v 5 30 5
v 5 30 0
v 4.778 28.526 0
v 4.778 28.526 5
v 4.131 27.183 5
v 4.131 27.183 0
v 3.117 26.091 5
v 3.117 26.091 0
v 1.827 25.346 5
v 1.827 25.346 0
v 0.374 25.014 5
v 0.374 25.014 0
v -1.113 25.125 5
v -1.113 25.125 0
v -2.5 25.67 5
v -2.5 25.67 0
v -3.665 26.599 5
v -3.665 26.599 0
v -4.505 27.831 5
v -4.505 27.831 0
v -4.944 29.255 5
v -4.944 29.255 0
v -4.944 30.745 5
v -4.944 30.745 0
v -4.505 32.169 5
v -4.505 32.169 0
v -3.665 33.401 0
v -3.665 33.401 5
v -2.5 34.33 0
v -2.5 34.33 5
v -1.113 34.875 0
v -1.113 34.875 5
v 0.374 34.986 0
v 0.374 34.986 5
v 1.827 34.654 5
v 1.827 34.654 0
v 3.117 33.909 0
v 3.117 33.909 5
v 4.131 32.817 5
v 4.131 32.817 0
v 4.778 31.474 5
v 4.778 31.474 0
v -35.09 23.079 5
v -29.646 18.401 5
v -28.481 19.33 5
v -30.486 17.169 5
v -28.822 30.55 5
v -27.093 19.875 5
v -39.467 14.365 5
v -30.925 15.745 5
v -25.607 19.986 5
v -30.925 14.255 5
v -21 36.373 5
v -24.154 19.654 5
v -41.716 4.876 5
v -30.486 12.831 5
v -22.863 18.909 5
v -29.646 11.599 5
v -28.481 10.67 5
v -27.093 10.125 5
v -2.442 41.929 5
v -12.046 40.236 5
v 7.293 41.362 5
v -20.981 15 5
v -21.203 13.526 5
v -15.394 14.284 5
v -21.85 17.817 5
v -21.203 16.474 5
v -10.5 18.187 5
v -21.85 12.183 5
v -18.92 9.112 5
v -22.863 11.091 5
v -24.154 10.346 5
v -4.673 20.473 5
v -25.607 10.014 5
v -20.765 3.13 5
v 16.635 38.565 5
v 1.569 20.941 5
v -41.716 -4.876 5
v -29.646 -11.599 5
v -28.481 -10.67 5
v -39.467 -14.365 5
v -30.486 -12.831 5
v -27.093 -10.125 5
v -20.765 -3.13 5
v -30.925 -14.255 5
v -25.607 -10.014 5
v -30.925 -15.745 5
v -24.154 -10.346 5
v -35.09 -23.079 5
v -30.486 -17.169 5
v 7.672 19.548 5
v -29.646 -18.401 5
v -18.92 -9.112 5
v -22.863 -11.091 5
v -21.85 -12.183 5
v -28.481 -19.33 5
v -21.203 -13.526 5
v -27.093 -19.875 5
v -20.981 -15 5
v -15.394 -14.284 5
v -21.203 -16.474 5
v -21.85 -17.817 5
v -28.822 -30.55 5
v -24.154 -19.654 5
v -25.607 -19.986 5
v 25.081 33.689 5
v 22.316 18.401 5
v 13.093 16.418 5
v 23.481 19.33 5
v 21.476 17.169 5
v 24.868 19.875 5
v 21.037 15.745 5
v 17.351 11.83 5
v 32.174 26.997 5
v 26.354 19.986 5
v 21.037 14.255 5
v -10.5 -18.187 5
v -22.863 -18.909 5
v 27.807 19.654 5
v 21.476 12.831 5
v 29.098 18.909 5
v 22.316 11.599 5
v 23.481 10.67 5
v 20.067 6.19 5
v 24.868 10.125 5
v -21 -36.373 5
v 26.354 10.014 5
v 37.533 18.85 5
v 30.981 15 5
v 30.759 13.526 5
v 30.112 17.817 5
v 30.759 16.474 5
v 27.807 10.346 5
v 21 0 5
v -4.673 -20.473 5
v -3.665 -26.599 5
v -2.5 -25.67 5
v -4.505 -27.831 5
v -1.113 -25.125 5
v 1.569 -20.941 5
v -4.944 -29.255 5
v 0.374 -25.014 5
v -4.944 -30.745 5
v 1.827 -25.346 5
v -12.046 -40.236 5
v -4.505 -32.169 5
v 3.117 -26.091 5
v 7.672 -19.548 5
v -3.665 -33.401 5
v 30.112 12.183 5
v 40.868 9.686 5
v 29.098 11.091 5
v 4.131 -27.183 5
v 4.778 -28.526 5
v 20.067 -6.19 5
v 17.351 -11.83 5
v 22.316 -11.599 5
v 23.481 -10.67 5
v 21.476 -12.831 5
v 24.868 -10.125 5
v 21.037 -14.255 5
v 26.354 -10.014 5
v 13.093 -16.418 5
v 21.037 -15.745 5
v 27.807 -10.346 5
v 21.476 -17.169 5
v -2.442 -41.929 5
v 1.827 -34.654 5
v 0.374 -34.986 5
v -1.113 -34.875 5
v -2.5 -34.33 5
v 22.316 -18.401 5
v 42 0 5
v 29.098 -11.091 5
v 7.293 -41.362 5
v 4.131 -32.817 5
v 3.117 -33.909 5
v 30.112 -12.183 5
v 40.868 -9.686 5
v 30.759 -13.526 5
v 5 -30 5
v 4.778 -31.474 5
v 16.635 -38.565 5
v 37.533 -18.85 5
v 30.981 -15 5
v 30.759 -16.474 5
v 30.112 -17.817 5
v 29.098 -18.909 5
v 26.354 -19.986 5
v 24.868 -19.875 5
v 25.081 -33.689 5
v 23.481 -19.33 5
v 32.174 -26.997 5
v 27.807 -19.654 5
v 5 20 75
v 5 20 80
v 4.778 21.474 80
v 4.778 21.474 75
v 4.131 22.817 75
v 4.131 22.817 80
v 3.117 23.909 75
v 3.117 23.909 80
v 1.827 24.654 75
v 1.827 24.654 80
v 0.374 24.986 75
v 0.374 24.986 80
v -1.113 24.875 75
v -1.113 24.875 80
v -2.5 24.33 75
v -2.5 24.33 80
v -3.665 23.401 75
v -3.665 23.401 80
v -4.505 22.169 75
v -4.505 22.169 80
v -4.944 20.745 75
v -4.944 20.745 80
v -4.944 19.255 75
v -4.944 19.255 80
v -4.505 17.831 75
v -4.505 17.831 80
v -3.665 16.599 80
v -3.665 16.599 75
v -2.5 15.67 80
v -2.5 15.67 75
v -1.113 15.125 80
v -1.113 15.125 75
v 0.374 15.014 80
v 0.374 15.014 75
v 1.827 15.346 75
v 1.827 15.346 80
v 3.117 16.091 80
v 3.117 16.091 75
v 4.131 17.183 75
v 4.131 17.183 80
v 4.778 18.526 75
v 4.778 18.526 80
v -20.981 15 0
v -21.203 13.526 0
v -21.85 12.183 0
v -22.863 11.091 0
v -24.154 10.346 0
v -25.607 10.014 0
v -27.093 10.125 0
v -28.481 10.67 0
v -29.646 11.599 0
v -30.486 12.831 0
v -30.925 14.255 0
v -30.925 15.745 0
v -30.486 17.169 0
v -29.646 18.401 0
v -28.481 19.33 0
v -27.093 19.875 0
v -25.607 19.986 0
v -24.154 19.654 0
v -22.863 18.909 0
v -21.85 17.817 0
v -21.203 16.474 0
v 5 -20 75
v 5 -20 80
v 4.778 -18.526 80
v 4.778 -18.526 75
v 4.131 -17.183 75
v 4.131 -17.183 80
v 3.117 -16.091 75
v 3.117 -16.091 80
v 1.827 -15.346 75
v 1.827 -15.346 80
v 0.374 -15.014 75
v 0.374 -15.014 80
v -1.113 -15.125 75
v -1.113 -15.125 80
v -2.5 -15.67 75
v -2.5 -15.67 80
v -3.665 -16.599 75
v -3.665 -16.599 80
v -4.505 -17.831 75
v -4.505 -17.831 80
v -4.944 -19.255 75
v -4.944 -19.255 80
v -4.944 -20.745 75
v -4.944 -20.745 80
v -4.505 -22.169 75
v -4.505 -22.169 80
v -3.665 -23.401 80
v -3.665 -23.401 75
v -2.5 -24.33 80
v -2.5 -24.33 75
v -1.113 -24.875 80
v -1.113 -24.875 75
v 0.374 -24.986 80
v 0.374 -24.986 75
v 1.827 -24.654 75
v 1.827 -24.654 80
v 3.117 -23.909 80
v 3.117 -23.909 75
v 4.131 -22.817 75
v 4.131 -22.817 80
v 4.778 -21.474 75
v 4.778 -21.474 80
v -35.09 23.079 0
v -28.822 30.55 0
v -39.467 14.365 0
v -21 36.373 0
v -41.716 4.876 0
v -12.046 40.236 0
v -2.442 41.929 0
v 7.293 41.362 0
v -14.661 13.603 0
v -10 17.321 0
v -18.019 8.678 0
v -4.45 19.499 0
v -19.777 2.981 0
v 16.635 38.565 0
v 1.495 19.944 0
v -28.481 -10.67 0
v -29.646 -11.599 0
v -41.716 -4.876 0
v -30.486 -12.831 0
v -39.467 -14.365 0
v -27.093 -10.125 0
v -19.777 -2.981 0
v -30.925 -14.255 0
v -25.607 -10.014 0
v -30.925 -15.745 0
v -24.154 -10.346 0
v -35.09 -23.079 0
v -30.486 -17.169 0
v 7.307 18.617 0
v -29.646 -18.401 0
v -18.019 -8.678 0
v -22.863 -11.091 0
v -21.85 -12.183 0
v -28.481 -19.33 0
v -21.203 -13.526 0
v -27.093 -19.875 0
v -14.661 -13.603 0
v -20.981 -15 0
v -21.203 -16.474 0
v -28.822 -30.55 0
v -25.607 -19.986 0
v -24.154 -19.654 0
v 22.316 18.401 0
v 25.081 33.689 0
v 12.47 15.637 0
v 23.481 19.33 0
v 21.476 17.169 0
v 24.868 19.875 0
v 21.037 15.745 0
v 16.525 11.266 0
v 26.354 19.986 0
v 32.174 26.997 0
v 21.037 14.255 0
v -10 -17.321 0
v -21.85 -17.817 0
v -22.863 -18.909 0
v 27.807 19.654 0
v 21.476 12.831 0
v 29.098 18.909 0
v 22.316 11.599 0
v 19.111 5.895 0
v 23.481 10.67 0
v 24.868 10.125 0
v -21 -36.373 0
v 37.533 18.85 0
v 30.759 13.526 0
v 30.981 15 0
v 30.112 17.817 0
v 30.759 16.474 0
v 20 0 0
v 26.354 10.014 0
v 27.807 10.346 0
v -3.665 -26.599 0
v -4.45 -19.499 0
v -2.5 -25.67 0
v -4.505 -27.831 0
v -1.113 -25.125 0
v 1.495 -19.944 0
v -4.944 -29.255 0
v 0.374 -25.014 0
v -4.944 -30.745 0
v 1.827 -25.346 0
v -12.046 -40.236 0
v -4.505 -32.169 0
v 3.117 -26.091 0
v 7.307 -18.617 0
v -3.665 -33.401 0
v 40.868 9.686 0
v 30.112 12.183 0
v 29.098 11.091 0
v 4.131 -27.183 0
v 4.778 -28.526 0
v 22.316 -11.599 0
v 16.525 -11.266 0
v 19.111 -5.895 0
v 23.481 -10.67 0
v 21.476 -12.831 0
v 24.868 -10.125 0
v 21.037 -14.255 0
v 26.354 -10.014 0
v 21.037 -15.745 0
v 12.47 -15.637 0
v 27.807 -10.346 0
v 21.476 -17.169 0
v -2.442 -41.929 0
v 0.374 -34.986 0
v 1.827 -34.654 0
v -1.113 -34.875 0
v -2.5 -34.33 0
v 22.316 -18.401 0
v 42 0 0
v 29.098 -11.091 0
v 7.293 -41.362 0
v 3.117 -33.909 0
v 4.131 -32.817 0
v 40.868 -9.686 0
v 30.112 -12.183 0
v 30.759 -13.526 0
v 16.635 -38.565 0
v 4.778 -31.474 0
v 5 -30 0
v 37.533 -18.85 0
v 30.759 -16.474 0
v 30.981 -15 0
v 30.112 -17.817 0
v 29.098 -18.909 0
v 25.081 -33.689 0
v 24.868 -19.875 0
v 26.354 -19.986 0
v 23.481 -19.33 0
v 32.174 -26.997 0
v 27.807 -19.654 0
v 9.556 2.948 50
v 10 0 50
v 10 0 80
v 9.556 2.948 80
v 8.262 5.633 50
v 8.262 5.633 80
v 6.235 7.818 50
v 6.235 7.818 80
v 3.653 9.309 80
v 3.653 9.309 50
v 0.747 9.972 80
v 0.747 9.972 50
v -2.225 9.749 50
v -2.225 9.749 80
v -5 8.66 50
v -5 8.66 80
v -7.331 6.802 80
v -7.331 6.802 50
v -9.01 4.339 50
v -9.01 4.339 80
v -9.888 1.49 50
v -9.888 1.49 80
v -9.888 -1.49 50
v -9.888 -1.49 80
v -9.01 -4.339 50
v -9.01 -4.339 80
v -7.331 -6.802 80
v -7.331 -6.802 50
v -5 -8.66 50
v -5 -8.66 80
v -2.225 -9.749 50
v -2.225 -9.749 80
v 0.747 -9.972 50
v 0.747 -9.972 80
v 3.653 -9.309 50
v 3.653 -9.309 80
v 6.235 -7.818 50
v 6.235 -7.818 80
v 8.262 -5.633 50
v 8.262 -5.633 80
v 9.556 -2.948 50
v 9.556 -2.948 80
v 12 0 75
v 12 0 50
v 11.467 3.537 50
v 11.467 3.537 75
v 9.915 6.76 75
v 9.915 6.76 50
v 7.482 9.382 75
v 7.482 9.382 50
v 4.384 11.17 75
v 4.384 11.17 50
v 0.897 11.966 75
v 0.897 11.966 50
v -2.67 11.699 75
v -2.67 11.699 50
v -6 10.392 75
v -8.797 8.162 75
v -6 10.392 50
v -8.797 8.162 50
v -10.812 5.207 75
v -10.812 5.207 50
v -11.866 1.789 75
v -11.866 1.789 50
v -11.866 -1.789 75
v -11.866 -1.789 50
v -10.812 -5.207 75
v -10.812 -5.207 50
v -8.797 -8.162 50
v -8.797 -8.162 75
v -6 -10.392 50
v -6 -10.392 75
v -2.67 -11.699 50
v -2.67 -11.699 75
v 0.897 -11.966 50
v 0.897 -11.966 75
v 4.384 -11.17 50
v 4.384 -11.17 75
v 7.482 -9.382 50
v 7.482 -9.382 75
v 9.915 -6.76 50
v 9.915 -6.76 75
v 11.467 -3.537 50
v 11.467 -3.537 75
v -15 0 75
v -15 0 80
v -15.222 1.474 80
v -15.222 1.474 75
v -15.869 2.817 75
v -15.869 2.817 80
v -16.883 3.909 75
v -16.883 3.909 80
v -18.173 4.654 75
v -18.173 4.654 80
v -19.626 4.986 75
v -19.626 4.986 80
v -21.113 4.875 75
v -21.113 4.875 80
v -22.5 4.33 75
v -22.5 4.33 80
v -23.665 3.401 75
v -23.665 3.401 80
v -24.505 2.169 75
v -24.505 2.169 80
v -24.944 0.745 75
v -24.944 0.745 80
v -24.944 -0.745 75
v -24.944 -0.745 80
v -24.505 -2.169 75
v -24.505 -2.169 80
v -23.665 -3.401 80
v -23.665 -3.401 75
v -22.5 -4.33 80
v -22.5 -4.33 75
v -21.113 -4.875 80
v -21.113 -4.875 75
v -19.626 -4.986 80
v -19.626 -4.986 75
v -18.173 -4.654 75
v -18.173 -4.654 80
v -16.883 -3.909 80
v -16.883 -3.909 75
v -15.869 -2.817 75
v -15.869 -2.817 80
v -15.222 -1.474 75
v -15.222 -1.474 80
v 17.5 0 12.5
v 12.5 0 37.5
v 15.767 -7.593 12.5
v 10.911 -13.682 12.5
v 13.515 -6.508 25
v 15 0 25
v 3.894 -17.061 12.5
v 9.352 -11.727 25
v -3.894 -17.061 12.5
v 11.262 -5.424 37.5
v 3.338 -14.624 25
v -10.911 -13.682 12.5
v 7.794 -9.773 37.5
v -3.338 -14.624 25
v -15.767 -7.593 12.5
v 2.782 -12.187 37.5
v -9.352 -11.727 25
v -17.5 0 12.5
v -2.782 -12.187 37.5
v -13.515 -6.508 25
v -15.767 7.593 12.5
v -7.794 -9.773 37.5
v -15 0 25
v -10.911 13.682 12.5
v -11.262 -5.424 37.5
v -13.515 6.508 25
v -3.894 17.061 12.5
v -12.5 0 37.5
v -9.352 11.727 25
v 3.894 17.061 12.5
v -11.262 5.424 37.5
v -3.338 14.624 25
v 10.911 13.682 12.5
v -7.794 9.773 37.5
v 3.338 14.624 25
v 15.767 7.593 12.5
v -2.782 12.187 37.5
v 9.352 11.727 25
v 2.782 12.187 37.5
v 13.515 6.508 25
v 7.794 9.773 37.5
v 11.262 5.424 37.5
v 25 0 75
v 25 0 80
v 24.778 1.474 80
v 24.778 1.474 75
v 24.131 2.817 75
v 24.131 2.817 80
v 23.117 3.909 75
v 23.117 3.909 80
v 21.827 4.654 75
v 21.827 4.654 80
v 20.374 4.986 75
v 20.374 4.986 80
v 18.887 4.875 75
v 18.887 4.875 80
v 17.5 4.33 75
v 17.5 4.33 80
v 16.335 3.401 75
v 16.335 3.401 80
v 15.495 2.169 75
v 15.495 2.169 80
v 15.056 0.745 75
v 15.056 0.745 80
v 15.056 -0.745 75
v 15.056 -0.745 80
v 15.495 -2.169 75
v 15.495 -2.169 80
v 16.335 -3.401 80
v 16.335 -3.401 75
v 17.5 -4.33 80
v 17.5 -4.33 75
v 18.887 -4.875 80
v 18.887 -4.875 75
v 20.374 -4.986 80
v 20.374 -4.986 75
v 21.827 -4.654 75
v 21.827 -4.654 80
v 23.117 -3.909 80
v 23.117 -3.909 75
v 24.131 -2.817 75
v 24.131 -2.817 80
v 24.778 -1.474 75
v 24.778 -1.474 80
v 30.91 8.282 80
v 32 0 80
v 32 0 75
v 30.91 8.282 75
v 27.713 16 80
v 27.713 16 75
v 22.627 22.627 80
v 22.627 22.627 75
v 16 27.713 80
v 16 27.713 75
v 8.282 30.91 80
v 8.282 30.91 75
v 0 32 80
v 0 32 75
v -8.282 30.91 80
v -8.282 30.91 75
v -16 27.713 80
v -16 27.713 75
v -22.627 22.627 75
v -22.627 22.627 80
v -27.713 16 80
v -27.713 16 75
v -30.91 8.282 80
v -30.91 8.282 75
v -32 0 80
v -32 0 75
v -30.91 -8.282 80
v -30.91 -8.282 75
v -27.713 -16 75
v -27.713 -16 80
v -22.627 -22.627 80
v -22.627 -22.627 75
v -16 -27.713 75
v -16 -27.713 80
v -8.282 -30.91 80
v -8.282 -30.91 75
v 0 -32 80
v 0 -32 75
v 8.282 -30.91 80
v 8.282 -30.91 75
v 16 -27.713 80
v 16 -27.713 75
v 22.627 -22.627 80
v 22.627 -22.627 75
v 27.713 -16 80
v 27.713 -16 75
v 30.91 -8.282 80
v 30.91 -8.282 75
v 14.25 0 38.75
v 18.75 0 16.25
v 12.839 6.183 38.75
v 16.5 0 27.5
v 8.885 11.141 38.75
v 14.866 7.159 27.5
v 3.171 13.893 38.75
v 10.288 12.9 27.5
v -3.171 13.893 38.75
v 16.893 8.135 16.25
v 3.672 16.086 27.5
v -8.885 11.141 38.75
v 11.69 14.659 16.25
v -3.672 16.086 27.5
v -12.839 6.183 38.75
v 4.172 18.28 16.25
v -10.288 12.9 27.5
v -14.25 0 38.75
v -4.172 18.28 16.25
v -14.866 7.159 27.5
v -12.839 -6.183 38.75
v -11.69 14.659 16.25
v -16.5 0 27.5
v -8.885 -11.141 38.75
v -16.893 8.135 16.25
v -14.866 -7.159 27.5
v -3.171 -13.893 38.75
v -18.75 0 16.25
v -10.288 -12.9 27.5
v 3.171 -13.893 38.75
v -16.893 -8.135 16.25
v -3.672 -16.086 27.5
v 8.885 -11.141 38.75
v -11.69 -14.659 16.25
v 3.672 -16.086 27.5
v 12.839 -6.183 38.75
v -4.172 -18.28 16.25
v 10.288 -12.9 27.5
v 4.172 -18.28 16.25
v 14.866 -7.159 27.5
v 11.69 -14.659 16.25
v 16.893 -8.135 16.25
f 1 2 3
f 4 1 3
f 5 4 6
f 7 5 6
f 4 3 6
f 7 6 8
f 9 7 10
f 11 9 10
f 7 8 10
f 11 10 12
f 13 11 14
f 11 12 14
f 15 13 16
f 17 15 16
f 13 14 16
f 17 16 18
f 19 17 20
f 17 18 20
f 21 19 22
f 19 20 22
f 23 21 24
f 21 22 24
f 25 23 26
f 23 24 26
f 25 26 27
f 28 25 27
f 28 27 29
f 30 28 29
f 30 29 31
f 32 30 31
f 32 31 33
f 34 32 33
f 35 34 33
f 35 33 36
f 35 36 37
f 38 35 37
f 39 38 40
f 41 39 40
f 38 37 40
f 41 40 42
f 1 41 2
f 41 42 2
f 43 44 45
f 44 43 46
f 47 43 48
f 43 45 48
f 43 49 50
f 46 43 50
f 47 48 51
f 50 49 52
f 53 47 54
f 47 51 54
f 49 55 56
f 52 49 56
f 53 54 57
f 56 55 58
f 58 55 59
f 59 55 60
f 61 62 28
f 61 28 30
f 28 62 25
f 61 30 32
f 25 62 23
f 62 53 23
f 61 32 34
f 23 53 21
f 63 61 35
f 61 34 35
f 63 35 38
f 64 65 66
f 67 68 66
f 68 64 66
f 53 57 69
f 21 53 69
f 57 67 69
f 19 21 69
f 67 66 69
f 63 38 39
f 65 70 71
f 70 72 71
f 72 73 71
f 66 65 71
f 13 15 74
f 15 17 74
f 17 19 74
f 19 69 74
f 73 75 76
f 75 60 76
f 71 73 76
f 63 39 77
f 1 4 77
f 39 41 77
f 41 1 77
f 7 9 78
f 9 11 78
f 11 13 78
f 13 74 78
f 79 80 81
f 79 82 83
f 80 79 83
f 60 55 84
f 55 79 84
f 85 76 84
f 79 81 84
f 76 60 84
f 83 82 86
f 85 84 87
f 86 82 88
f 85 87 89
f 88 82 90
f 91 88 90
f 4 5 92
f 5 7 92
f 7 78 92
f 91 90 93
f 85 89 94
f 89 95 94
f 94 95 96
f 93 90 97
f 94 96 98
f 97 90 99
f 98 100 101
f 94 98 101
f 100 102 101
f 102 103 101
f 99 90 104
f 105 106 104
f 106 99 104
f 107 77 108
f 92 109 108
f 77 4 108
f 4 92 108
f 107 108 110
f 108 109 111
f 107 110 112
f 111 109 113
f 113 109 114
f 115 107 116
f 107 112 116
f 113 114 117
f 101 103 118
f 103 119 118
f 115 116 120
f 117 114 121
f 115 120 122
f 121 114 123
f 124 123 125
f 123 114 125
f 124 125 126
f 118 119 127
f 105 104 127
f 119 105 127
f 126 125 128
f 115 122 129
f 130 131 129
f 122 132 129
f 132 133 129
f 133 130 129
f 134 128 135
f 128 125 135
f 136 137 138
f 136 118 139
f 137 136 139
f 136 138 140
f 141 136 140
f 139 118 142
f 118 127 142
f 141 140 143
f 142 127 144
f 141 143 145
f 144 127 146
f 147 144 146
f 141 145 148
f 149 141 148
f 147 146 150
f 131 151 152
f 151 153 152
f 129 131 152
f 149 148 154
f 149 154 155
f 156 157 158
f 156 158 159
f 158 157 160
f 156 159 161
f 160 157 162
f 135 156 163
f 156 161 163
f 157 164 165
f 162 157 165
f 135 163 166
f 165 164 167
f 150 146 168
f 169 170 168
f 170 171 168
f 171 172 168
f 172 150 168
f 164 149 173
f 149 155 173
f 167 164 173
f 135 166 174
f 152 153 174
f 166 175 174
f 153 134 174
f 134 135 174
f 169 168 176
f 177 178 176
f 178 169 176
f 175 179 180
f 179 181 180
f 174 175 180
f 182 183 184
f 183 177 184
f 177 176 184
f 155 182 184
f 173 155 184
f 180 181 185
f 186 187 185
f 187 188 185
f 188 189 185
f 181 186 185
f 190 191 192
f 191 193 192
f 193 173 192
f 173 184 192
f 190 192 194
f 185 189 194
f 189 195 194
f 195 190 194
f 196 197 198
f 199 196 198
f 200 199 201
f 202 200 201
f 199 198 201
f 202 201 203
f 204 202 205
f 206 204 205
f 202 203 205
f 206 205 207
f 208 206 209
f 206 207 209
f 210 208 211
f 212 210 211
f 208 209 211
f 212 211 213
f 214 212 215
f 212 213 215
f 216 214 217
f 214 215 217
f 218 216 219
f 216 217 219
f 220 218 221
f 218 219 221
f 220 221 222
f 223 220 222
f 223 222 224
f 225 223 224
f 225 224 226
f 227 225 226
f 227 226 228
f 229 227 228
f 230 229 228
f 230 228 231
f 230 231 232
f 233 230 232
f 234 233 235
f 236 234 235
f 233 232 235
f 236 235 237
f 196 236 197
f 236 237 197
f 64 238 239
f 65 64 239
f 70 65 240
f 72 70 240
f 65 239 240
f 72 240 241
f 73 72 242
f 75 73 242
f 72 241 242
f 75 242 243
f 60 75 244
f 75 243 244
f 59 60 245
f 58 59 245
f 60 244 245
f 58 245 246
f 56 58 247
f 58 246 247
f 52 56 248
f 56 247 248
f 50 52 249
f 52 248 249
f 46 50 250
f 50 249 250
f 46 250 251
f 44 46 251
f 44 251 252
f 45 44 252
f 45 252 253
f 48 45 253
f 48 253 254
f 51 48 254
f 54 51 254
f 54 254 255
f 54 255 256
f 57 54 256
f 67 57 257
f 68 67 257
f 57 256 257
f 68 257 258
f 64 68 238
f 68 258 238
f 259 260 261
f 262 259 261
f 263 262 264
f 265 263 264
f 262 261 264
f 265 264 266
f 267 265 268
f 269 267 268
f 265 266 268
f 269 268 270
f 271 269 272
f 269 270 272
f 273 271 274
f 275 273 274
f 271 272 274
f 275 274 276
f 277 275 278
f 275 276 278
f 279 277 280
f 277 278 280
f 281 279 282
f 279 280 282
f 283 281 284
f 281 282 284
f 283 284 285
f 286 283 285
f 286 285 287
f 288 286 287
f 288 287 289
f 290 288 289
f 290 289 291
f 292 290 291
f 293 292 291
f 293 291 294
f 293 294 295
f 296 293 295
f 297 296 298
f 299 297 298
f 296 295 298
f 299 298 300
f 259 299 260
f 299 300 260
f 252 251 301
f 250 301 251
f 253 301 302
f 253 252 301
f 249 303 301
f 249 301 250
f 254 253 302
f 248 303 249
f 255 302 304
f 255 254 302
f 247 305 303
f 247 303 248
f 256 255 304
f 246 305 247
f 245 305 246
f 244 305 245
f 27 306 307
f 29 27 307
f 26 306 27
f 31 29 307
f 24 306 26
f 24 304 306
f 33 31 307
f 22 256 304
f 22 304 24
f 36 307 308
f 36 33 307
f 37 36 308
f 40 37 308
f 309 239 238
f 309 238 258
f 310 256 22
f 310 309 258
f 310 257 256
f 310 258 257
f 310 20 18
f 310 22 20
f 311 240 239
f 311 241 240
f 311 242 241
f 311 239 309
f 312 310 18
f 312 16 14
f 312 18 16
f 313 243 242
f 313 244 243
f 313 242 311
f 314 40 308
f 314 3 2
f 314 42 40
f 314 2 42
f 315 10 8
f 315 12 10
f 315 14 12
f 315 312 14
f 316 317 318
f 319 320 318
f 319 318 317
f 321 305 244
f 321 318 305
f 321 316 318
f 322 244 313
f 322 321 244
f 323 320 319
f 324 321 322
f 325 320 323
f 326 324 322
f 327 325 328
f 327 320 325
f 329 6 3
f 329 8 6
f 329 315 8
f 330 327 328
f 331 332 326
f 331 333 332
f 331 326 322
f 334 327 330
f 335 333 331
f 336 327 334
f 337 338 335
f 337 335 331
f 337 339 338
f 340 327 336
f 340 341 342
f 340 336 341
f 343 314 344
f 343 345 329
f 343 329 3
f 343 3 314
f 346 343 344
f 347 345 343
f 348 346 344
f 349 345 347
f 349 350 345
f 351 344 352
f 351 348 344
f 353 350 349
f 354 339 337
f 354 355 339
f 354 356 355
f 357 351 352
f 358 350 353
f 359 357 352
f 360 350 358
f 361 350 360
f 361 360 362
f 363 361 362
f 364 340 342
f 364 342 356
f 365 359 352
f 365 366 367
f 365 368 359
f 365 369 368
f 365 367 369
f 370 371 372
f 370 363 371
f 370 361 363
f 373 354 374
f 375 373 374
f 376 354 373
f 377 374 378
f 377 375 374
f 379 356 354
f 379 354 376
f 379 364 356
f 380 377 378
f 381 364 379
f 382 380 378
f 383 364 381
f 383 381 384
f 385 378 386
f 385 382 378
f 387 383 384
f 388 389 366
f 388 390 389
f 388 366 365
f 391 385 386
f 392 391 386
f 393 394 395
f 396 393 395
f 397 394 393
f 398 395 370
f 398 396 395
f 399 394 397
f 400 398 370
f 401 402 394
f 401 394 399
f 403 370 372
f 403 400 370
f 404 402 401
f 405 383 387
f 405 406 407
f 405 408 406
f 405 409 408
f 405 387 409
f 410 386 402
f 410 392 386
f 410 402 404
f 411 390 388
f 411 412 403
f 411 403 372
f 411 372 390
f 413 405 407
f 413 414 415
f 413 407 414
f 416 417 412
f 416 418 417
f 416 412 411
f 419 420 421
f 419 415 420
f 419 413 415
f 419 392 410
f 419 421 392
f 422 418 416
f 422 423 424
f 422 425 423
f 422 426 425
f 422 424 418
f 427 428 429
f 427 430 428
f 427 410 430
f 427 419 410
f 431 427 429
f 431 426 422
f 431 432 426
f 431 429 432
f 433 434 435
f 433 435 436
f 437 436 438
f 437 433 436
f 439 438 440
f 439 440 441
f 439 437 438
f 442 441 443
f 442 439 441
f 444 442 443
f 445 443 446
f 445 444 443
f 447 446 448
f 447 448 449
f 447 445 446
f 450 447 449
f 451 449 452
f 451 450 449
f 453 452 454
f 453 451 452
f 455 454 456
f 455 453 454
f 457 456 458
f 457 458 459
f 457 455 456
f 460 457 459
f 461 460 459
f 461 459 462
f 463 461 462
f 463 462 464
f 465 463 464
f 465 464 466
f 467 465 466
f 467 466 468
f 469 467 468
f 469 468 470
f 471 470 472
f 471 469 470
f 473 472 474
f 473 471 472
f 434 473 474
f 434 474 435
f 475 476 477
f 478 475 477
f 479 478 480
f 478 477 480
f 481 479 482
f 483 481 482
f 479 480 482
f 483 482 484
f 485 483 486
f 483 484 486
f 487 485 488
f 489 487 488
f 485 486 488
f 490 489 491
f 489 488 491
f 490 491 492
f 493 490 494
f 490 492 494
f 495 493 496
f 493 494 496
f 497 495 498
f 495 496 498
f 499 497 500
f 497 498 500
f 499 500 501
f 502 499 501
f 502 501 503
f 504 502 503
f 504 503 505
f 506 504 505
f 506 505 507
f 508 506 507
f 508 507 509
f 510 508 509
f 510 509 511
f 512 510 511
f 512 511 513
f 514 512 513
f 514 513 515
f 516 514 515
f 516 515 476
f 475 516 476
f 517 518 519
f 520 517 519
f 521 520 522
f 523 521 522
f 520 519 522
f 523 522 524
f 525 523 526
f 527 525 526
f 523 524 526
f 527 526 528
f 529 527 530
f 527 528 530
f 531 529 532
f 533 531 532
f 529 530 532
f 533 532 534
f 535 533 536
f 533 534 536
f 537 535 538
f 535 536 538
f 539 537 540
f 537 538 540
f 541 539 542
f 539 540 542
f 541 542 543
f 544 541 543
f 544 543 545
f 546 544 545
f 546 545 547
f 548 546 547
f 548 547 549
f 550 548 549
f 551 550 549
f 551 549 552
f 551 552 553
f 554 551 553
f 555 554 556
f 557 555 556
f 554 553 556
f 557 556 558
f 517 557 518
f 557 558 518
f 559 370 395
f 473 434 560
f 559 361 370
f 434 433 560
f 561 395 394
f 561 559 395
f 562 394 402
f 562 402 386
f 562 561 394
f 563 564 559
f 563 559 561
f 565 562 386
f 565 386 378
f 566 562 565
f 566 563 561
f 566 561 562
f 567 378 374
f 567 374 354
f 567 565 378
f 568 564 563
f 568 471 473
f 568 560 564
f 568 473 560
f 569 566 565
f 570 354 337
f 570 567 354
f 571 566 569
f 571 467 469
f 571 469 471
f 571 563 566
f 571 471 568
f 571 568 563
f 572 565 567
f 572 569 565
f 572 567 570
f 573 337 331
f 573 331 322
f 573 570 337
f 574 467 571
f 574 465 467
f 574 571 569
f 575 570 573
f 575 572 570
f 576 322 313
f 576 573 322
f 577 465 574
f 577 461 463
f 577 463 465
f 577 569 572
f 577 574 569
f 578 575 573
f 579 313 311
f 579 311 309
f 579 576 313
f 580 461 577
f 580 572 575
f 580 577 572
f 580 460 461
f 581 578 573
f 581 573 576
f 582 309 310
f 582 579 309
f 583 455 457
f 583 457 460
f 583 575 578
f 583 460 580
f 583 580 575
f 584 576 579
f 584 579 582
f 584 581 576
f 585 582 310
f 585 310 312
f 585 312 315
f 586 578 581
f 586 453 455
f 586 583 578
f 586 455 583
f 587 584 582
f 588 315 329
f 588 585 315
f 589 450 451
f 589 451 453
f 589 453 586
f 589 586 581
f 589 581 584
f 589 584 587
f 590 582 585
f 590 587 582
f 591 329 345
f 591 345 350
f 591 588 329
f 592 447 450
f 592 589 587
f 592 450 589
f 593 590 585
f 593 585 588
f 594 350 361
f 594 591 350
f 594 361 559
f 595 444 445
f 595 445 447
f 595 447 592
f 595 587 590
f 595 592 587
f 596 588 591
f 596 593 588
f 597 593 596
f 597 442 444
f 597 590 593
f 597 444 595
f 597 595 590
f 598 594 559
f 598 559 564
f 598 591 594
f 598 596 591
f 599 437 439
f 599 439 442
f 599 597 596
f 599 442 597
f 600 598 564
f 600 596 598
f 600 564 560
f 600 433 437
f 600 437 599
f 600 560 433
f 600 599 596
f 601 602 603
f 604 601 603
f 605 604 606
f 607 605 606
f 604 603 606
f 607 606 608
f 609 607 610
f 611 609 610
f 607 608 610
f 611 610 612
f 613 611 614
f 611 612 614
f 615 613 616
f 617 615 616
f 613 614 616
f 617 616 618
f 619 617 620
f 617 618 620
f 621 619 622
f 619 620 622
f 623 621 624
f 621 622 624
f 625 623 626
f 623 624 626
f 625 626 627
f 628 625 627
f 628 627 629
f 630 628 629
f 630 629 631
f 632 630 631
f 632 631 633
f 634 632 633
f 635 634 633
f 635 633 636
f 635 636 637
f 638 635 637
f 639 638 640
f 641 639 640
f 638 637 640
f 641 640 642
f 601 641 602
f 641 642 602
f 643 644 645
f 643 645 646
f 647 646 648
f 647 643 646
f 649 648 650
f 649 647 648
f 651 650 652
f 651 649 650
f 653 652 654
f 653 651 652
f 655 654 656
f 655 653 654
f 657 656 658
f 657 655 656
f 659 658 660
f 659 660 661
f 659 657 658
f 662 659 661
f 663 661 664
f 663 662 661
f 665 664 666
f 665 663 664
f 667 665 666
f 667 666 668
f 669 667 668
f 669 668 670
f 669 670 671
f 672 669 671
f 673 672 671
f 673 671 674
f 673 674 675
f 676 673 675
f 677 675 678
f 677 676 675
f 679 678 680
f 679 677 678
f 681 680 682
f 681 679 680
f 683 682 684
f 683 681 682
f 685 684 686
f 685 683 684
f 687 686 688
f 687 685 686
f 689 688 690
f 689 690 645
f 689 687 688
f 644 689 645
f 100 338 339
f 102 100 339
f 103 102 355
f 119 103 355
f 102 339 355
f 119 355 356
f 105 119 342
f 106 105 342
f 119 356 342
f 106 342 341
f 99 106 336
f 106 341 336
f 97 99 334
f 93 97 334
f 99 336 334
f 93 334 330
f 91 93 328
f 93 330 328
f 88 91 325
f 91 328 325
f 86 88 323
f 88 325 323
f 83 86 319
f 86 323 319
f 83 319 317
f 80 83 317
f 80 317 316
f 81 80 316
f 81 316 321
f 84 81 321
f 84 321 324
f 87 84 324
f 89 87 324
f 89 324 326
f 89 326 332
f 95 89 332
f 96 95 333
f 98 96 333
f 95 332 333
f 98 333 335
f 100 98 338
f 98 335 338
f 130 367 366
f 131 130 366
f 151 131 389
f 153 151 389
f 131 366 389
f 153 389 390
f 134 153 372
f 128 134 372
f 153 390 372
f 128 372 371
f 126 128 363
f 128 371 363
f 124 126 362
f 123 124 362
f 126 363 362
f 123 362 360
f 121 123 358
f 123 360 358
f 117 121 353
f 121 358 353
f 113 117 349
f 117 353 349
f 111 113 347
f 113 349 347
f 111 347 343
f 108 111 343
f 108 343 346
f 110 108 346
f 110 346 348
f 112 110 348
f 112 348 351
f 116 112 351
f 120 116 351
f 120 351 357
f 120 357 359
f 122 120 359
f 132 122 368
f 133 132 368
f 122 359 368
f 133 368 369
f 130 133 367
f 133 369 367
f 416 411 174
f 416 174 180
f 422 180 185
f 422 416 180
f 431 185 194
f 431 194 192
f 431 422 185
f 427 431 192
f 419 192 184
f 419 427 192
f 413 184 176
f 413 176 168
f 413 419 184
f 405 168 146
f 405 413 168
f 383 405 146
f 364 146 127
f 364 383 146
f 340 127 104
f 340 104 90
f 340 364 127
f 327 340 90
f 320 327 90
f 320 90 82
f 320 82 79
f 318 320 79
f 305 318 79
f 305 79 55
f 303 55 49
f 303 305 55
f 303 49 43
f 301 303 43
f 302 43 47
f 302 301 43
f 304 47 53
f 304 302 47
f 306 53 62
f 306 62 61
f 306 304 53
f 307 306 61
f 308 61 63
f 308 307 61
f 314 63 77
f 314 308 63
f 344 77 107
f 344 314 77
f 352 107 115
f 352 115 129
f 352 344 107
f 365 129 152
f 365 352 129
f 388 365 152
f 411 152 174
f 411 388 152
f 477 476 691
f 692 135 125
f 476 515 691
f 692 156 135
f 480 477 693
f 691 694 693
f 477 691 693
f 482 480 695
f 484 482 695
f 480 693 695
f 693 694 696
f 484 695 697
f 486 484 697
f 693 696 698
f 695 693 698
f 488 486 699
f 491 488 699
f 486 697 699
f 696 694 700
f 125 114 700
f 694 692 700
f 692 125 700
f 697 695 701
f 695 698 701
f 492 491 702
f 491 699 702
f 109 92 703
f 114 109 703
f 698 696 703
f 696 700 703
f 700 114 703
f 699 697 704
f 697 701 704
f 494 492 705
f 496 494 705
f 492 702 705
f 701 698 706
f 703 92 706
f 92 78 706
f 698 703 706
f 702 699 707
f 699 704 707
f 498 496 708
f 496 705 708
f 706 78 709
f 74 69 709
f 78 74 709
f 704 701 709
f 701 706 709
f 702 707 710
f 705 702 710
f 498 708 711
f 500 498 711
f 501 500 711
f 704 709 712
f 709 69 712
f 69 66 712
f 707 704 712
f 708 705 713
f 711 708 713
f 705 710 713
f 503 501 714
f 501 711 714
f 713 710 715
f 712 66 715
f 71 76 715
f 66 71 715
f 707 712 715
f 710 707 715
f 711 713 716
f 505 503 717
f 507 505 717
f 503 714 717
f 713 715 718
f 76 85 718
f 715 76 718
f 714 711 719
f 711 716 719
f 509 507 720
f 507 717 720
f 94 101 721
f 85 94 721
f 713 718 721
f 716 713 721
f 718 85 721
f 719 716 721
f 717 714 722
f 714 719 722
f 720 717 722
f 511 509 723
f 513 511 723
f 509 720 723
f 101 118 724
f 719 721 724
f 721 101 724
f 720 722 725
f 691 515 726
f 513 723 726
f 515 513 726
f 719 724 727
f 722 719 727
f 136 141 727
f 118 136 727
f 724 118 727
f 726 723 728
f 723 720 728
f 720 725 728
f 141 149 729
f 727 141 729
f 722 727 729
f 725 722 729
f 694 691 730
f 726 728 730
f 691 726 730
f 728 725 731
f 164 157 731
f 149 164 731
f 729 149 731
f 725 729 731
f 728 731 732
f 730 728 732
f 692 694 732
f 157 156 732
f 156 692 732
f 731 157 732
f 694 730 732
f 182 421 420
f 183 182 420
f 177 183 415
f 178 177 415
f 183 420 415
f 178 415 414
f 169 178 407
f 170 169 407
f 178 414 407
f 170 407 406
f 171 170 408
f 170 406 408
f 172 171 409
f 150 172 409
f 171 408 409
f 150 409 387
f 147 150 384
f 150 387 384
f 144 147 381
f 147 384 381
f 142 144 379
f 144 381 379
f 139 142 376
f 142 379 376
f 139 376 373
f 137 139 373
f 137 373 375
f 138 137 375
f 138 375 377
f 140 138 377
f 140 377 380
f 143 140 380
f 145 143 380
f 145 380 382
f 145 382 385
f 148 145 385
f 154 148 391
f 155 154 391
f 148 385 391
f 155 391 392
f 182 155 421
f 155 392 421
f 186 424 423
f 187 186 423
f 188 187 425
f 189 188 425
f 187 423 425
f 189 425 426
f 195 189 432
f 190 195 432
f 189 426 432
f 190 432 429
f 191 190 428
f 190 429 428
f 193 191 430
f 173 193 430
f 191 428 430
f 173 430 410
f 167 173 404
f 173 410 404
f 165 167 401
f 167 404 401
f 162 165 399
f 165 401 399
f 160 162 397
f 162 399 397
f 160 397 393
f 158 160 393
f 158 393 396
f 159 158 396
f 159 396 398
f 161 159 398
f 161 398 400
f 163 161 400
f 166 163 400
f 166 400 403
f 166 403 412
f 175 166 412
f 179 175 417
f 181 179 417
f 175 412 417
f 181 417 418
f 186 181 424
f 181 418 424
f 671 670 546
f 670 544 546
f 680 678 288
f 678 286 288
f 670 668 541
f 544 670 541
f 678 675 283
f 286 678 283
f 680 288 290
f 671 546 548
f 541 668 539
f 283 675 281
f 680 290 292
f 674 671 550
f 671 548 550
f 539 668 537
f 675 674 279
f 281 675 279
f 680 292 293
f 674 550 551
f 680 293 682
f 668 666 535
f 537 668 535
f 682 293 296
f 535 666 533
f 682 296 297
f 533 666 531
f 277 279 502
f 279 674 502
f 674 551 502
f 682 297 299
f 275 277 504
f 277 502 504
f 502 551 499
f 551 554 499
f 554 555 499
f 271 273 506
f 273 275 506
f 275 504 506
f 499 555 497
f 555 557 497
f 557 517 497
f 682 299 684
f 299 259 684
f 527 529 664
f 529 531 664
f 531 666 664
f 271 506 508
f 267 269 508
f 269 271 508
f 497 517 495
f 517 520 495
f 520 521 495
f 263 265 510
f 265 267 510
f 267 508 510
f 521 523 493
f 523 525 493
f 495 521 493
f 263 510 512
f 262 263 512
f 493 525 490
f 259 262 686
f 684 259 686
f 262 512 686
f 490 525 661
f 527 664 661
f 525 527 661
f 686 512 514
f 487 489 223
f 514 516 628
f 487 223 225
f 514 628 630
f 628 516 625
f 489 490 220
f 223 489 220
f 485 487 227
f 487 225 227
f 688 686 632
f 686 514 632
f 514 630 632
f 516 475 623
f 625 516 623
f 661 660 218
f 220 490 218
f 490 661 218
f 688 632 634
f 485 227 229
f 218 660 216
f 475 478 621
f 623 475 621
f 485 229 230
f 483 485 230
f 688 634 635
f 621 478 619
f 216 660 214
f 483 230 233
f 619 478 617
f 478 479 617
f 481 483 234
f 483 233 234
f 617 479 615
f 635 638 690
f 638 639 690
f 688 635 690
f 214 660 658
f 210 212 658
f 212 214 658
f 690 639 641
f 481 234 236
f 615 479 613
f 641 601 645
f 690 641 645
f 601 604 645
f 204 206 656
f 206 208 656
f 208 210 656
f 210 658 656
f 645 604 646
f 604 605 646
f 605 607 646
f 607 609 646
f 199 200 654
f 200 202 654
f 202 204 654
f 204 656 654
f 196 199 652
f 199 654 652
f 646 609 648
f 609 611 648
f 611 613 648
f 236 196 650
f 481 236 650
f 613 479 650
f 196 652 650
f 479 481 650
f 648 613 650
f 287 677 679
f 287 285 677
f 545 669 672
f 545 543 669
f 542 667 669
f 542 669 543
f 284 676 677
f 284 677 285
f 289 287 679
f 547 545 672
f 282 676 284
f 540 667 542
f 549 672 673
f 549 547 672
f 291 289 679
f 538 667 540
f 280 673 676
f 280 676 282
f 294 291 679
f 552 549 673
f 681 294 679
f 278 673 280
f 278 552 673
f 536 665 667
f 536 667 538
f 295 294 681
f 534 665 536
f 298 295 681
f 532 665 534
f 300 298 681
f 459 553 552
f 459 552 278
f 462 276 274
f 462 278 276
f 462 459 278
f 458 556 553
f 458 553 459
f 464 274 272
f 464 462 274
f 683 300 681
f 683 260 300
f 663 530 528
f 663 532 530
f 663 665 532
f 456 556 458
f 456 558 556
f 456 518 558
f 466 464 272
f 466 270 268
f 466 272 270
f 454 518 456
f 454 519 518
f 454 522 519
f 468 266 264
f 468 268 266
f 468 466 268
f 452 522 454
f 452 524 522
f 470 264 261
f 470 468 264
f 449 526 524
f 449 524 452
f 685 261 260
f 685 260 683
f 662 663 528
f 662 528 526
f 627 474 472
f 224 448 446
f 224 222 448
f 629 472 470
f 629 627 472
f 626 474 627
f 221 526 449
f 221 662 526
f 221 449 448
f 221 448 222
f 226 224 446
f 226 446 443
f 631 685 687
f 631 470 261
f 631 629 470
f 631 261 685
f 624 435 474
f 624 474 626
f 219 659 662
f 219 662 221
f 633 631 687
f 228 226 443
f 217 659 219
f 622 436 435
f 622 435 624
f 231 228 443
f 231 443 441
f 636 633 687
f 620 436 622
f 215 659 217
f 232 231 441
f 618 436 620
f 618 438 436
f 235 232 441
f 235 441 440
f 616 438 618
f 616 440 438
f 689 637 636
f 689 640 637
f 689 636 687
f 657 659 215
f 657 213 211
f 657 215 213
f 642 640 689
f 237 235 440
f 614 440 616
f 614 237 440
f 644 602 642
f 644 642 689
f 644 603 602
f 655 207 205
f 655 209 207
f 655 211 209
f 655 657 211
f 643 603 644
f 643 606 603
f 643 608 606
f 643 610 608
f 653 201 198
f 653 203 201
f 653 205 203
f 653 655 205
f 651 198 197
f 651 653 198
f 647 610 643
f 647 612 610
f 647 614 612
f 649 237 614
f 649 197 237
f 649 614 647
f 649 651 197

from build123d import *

# Parameters (mm, degrees)
F2_R      = 12
F0_R      = 22
F6_R      = 42
F6_R_2    = 20
F7_DEPTH  = 5
F5_R      = 20
F4_R      = 10
F9_R      = 5
F10_DEPTH = 5
F4_R_2    = 12
F11_DEPTH = 30
F12_R     = 32
F12_R_2   = 12
F13_DEPTH = 5
F14_R     = 5
F15_DEPTH = 5


with BuildPart() as f3:
    # F2 (on offset) → F3 section 0
    with BuildSketch(Plane.XY.offset(50)):
        Circle(F2_R)
    # F0 (on Top) → F3 section 1
    with BuildSketch(Plane.XY):
        Circle(F0_R)
    loft()

    # F6 (on face) → F7 (join)
    with BuildSketch(Plane(origin=(0, 0, 0), x_dir=(1, 0, 0), z_dir=(0, 0, -1))):
        Circle(F6_R)
        Circle(F6_R_2, mode=Mode.SUBTRACT)
    extrude(amount=-F7_DEPTH)

    # F5 (on face) → F8 section 0
    with BuildSketch(Plane(origin=(0, 0, 0), x_dir=(1, 0, 0), z_dir=(0, 0, -1))):
        Circle(F5_R)
    # F4 (on face) → F8 section 1
    with BuildSketch(Plane.XY.offset(50)):
        Circle(F4_R)
    loft(mode=Mode.SUBTRACT)

    # F9 (on face) → F10 (cut, through all)
    with BuildSketch(Plane(origin=(0, 0, 0), x_dir=(1, 0, 0), z_dir=(0, 0, -1))):
        with Locations((0, 30)):
            Circle(F9_R)
        with Locations((-25.9807621135, 15)):
            Circle(F9_R)
        with Locations((25.9807621135, 15)):
            Circle(F9_R)
        with Locations((25.9807621135, -15)):
            Circle(F9_R)
        with Locations((0, -30)):
            Circle(F9_R)
        with Locations((-25.9807621135, -15)):
            Circle(F9_R)
    extrude(amount=-F10_DEPTH, mode=Mode.SUBTRACT)

    # F4 (on face) → F11 (join)
    with BuildSketch(Plane.XY.offset(50)):
        Circle(F4_R_2)
        Circle(F4_R, mode=Mode.SUBTRACT)
    extrude(amount=F11_DEPTH)

    # F12 (on face) → F13 (join)
    with BuildSketch(Plane.XY.offset(80)):
        Circle(F12_R)
        Circle(F12_R_2, mode=Mode.SUBTRACT)
    extrude(amount=-F13_DEPTH)

    # F14 (on face) → F15 (cut, through all)
    with BuildSketch(Plane.XY.offset(80)):
        with Locations((0, 20)):
            Circle(F14_R)
        with Locations((-20, 0)):
            Circle(F14_R)
        with Locations((0, -20)):
            Circle(F14_R)
        with Locations((20, 0)):
            Circle(F14_R)
    extrude(amount=-F15_DEPTH, mode=Mode.SUBTRACT)


solid = f3.part
